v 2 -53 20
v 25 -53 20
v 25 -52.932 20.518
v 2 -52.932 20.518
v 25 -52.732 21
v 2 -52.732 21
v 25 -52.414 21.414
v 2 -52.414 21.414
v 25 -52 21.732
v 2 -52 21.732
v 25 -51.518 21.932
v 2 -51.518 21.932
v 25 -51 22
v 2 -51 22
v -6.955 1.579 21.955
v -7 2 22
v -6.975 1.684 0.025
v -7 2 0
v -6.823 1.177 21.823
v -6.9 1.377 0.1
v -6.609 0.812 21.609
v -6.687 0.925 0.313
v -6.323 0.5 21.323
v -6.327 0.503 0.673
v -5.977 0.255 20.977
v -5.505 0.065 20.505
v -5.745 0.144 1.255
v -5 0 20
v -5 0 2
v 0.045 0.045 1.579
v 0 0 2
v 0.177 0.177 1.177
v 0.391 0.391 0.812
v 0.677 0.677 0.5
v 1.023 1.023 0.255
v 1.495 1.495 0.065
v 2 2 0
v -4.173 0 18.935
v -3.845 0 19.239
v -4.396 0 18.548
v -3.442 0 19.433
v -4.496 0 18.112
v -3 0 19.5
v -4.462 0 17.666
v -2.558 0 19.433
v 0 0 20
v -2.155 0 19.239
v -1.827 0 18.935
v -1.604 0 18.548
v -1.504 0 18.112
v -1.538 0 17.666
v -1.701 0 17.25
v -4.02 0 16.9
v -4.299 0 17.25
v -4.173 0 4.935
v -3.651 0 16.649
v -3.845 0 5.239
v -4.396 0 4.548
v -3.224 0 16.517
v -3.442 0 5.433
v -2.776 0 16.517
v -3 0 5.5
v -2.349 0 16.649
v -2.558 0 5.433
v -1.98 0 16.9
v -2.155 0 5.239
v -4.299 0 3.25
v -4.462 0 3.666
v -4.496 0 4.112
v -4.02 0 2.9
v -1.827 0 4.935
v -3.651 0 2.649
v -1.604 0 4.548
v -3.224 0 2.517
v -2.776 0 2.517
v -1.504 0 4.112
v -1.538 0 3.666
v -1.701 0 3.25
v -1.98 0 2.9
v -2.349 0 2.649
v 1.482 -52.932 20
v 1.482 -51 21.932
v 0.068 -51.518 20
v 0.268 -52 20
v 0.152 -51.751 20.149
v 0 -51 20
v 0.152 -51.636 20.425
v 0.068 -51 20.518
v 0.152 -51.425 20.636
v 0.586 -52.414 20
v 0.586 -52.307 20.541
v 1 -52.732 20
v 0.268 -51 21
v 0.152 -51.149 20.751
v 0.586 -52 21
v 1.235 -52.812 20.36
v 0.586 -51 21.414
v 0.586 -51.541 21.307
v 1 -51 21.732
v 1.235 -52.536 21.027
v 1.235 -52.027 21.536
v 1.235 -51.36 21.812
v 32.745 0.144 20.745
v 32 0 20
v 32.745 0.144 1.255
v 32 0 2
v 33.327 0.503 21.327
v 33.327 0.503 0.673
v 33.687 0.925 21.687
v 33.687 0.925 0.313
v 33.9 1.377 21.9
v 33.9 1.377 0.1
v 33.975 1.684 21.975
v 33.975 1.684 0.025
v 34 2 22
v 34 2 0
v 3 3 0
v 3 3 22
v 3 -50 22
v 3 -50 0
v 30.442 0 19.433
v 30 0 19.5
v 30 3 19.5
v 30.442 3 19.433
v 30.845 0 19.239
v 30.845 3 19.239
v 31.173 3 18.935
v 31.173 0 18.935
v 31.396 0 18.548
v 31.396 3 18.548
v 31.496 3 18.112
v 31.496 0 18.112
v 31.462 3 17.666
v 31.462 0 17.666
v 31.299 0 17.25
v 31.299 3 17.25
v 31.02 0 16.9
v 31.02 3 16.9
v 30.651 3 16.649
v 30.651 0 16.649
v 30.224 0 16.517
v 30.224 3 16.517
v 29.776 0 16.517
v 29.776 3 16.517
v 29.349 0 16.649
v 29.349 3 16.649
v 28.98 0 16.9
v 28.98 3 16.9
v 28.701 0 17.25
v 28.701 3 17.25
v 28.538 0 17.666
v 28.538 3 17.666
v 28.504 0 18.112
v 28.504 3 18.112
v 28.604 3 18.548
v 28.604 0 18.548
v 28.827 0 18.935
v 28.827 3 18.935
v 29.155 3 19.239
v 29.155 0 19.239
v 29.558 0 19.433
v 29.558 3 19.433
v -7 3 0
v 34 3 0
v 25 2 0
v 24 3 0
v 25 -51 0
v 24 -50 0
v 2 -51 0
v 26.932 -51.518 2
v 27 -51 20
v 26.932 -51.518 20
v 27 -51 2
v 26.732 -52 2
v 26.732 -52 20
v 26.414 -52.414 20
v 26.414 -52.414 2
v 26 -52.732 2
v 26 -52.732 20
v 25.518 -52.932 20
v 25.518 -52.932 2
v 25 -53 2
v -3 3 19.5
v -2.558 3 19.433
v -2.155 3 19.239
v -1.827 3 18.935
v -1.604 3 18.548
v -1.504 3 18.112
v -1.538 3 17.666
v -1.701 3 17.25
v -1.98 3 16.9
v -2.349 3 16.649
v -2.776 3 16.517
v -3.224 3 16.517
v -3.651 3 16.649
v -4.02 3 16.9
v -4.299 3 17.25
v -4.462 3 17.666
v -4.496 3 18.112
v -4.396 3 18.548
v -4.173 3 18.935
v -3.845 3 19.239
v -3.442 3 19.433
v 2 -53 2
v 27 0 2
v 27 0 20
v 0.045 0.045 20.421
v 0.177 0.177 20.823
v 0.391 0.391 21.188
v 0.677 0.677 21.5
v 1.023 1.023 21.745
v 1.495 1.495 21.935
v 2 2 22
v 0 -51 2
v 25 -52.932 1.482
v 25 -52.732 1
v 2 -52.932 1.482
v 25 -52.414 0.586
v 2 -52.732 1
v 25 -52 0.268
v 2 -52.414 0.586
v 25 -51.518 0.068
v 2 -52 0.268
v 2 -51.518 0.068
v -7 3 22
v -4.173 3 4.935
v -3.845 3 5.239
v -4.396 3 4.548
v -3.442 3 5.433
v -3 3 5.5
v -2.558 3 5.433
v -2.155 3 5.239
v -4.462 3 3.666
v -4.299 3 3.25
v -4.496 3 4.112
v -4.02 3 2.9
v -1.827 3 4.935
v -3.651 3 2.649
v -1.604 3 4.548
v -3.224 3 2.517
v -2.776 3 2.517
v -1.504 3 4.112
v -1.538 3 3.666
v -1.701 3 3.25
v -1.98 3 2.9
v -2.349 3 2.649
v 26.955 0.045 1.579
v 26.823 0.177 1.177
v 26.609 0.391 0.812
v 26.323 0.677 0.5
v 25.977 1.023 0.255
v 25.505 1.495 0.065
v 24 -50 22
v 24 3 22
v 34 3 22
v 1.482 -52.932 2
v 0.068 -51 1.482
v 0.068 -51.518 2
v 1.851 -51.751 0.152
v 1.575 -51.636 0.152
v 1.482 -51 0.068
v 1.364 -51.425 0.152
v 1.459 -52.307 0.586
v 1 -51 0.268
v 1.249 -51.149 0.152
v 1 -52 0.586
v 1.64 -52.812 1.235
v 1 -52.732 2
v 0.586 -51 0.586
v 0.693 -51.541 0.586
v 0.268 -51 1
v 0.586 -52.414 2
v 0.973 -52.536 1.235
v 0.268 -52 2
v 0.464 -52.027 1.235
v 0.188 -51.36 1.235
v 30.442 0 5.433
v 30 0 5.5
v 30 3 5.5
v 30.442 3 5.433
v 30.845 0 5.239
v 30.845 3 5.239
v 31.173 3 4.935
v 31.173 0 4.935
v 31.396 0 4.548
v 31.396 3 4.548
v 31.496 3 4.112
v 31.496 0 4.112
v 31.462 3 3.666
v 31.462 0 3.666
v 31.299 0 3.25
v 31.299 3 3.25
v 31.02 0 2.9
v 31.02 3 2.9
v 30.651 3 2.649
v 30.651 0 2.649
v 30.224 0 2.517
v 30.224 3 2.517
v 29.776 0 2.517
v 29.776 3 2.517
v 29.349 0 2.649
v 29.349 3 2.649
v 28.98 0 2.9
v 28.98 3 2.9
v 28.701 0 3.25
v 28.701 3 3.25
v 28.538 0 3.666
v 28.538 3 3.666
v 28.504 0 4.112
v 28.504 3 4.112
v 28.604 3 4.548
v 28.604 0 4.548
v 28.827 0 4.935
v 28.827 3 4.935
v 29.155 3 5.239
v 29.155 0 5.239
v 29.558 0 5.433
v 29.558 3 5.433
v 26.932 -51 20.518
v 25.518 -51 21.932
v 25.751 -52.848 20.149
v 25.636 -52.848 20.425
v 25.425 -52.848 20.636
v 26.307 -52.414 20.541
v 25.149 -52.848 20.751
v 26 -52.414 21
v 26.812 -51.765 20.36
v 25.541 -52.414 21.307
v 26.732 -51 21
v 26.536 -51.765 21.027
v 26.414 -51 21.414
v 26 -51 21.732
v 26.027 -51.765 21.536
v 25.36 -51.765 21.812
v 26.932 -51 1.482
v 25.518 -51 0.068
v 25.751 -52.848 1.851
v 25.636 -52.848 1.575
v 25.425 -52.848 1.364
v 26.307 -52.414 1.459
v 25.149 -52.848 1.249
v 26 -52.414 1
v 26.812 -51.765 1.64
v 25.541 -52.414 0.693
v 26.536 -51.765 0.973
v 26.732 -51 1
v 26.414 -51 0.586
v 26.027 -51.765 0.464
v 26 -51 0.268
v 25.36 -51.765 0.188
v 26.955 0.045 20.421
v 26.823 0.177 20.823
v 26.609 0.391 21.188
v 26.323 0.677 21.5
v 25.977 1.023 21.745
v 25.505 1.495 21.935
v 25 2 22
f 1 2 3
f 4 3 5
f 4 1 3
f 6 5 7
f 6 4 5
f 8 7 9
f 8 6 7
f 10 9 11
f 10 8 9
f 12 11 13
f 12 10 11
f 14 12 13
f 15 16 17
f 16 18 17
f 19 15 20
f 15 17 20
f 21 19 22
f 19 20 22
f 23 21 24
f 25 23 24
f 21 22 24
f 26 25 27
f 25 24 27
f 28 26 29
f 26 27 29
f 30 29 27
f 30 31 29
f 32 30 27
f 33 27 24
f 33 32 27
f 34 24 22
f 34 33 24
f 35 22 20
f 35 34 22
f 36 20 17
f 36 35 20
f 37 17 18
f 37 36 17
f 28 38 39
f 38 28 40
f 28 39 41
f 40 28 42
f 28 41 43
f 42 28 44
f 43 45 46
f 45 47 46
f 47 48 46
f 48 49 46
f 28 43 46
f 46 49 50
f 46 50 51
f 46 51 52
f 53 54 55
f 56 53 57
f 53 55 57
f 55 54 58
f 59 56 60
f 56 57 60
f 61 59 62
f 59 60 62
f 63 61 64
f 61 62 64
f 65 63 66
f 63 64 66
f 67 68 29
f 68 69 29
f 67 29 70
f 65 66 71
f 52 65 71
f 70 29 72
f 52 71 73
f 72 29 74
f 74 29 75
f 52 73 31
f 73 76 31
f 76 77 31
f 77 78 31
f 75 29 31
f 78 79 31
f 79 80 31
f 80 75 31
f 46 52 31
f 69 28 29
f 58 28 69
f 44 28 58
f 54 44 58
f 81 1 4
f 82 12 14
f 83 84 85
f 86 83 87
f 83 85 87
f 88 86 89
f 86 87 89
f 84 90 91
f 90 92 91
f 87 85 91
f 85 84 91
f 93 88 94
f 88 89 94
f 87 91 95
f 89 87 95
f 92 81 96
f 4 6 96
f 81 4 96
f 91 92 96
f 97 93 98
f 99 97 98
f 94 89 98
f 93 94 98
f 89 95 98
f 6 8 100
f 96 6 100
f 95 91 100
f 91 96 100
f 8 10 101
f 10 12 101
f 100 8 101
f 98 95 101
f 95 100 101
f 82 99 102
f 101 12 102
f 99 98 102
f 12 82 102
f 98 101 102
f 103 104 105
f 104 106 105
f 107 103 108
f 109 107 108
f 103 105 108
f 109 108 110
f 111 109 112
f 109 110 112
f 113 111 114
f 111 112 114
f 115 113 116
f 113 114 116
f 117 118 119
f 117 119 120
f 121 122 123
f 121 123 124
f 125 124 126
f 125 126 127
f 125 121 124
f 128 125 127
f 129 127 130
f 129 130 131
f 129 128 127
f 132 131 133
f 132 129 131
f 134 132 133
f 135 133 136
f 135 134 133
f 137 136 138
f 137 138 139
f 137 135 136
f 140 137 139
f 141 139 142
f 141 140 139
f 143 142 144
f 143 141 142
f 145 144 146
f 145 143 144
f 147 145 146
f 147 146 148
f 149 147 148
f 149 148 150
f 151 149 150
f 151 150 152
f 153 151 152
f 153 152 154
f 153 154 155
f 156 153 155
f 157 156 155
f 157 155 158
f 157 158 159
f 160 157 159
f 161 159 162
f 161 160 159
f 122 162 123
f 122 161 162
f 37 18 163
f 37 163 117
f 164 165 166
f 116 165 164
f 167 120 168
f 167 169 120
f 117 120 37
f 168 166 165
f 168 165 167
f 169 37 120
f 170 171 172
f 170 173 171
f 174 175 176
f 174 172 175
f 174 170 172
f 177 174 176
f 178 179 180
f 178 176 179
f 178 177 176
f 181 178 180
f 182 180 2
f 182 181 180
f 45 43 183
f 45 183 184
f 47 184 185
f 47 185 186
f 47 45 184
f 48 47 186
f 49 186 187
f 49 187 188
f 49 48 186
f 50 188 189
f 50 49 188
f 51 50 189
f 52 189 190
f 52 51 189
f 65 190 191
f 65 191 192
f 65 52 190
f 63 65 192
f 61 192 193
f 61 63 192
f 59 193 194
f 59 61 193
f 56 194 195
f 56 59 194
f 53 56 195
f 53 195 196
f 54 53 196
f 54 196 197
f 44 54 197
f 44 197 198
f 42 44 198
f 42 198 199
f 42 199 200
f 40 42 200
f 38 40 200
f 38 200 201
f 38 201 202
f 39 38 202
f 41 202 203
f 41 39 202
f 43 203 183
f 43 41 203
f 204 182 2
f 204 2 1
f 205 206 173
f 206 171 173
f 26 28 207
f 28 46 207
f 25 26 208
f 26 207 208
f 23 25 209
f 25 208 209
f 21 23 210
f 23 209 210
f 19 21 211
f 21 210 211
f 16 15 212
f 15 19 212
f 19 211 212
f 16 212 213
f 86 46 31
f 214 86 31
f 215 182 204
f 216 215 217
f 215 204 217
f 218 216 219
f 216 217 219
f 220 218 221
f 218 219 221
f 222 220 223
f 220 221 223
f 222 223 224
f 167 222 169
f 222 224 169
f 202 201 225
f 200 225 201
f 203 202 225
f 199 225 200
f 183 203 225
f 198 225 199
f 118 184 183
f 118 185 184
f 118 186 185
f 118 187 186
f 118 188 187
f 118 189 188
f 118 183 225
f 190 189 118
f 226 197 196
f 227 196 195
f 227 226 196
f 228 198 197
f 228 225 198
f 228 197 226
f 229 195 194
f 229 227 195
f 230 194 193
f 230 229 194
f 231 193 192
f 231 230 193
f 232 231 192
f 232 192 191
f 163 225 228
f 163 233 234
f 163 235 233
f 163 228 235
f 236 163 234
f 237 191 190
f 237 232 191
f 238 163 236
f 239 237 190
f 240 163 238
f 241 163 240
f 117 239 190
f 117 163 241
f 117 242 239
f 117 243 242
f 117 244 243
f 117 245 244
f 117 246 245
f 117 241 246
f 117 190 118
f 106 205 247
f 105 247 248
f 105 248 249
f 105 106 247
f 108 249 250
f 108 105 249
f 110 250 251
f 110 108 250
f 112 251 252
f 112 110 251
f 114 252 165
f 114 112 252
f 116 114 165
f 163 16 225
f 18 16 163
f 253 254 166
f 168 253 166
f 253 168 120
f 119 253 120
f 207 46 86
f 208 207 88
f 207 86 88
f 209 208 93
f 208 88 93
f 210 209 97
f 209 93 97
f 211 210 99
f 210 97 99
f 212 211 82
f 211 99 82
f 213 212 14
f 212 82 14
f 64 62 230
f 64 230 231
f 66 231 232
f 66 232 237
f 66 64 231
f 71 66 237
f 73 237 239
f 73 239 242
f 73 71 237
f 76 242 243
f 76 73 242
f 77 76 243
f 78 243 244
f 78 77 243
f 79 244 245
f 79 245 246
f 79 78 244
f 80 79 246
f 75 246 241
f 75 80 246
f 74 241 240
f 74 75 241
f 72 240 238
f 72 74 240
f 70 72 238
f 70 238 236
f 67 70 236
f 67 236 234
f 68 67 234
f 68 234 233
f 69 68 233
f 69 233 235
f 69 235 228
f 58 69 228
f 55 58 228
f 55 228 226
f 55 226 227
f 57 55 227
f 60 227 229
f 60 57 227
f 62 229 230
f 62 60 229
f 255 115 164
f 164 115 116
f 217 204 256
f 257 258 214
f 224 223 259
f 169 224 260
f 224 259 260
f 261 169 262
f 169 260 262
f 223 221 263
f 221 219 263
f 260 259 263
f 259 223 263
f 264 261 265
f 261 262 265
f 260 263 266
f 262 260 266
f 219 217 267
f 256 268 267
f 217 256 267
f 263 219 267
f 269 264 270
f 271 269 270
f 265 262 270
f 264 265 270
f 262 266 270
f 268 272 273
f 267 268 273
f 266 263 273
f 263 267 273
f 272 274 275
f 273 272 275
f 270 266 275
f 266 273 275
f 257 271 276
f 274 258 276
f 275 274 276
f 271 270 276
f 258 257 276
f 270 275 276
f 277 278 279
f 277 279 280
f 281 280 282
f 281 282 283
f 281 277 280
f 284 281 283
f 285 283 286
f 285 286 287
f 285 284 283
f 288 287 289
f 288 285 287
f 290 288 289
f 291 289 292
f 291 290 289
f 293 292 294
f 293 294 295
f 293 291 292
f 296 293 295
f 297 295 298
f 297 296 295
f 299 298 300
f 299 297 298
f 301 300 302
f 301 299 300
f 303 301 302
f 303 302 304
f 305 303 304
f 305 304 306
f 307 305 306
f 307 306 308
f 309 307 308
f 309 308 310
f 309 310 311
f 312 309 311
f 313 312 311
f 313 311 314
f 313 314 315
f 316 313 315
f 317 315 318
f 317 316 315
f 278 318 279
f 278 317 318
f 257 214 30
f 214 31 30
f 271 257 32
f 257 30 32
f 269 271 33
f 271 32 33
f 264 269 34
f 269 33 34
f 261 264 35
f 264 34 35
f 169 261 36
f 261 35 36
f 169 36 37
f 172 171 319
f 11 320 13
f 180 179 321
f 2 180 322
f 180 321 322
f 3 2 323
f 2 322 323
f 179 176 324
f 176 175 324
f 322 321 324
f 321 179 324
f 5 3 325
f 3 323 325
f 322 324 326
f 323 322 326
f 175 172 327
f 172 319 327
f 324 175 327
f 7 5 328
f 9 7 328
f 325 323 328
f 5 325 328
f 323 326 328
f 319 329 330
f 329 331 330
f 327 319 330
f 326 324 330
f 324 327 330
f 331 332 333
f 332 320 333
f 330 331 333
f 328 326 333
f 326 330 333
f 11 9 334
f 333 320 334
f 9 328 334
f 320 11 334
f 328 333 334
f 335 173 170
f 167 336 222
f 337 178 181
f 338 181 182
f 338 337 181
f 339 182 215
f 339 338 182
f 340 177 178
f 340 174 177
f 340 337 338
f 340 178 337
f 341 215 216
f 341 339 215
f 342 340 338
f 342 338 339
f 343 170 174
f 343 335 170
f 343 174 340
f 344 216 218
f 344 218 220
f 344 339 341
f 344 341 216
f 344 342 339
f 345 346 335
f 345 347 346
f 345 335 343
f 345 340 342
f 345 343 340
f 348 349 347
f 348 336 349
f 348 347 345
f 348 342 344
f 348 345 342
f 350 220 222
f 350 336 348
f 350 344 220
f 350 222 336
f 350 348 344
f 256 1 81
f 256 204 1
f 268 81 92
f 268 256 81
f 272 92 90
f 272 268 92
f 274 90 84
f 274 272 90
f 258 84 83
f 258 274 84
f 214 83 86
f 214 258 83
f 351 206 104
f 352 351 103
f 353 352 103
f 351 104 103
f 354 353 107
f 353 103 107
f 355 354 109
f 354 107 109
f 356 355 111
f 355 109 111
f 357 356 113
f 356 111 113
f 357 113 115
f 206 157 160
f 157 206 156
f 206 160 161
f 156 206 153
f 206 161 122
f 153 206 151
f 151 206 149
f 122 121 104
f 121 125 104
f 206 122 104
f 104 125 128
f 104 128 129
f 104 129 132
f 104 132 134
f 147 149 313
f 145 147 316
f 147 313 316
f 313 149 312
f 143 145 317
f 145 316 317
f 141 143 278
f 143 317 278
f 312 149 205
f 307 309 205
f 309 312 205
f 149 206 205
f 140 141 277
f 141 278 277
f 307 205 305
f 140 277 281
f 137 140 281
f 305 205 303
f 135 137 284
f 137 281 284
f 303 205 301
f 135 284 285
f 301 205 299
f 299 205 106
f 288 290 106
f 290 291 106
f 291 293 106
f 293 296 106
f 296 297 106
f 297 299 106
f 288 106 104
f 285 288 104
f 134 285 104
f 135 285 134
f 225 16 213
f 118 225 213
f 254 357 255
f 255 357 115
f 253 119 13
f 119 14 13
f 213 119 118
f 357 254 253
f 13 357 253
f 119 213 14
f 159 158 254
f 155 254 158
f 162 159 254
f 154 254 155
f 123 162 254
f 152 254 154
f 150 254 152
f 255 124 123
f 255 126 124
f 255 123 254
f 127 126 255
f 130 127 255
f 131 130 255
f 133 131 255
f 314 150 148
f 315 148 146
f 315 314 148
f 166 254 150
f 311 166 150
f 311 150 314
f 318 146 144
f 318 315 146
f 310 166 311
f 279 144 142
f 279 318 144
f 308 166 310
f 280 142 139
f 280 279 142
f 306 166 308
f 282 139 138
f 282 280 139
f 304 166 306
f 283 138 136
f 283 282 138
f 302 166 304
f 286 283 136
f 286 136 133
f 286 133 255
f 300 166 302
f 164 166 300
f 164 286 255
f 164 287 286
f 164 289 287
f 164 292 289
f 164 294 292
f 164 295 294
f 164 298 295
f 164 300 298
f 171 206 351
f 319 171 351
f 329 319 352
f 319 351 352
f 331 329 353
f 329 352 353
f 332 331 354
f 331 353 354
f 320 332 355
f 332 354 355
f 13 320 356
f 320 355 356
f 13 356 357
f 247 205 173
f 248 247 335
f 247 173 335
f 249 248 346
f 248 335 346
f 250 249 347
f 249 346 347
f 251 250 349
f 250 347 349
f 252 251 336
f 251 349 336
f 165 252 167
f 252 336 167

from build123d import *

# Parameters (mm, degrees)
CROQUIS1_W              = 22
CROQUIS1_H              = 50
SALIENTE_EXTRUIR2_DEPTH = 3
CROQUIS2_W              = 27
CROQUIS2_H              = 22
SALIENTE_EXTRUIR3_DEPTH = 3
CROQUIS3_W              = 3
CROQUIS3_H              = 22
SALIENTE_EXTRUIR4_DEPTH = 50
CROQUIS4_W              = 10
CROQUIS4_H              = 22
CROQUIS4_R              = 1.5
SALIENTE_EXTRUIR5_DEPTH = 3
REDONDEO1_R             = 2


with BuildPart() as part:
    # Croquis1 → Saliente-Extruir2 (new body)
    with BuildSketch(Plane(origin=(0, 0, 0), x_dir=(0, 0, -1), z_dir=(1, 0, 0))):
        with Locations((-11, -25)):
            Rectangle(CROQUIS1_W, CROQUIS1_H)
    extrude(amount=SALIENTE_EXTRUIR2_DEPTH)

    # Croquis2 → Saliente-Extruir3 (add)
    with BuildSketch(Plane(origin=(0, -50, 0), x_dir=(-1, 0, 0), z_dir=(0, -1, 0))):
        with Locations((-13.5, -11)):
            Rectangle(CROQUIS2_W, CROQUIS2_H)
    extrude(amount=SALIENTE_EXTRUIR3_DEPTH)

    # Croquis3 → Saliente-Extruir4 (add)
    with BuildSketch(Plane(origin=(0, -50, 0), x_dir=(1, 0, 0), z_dir=(0, 1, 0))):
        with Locations((25.5, -11)):
            Rectangle(CROQUIS3_W, CROQUIS3_H)
    extrude(amount=SALIENTE_EXTRUIR4_DEPTH)

    # Croquis4 → Saliente-Extruir5 (add)
    # profile 1 of 2: a face of its own
    with BuildSketch(Plane(origin=(0, 0, 0), x_dir=(1, 0, 0), z_dir=(0, 1, 0))):
        with Locations((-2, -11)):
            Rectangle(CROQUIS4_W, CROQUIS4_H)
        with Locations(Location((-3, -4, 0), (0, 0, 270))):
            Circle(CROQUIS4_R, mode=Mode.SUBTRACT)
        with Locations(Location((-3, -18, 0), (0, 0, 270))):
            Circle(CROQUIS4_R, mode=Mode.SUBTRACT)
    # profile 2 of 2: a face of its own
    with BuildSketch(Plane(origin=(0, 0, 0), x_dir=(1, 0, 0), z_dir=(0, 1, 0))):
        with Locations((29, -11)):
            Rectangle(CROQUIS4_W, CROQUIS4_H)
        with Locations(Location((30, -18, 0), (0, 0, 270))):
            Circle(CROQUIS4_R, mode=Mode.SUBTRACT)
        with Locations(Location((30, -4, 0), (0, 0, 270))):
            Circle(CROQUIS4_R, mode=Mode.SUBTRACT)
    extrude(amount=SALIENTE_EXTRUIR5_DEPTH)

    # Redondeo1
    redondeo1_edges = [part.edges().sort_by_distance(p)[0] for p in [
        (27, -26.5, 0),
        (27, -26.5, 22),
        (27, -53, 11),
        (13.5, -53, 22),
        (0, -53, 11),
        (13.5, -53, 0),
        (-3.5, 0, 0),
        (-7, 0, 11),
        (-3.5, 0, 22),
        (0, -26.5, 0),
        (0, -26.5, 22),
        (30.5, 0, 22),
        (34, 0, 11),
        (30.5, 0, 0),
    ]]
    fillet(redondeo1_edges, radius=REDONDEO1_R)


solid = part.part
